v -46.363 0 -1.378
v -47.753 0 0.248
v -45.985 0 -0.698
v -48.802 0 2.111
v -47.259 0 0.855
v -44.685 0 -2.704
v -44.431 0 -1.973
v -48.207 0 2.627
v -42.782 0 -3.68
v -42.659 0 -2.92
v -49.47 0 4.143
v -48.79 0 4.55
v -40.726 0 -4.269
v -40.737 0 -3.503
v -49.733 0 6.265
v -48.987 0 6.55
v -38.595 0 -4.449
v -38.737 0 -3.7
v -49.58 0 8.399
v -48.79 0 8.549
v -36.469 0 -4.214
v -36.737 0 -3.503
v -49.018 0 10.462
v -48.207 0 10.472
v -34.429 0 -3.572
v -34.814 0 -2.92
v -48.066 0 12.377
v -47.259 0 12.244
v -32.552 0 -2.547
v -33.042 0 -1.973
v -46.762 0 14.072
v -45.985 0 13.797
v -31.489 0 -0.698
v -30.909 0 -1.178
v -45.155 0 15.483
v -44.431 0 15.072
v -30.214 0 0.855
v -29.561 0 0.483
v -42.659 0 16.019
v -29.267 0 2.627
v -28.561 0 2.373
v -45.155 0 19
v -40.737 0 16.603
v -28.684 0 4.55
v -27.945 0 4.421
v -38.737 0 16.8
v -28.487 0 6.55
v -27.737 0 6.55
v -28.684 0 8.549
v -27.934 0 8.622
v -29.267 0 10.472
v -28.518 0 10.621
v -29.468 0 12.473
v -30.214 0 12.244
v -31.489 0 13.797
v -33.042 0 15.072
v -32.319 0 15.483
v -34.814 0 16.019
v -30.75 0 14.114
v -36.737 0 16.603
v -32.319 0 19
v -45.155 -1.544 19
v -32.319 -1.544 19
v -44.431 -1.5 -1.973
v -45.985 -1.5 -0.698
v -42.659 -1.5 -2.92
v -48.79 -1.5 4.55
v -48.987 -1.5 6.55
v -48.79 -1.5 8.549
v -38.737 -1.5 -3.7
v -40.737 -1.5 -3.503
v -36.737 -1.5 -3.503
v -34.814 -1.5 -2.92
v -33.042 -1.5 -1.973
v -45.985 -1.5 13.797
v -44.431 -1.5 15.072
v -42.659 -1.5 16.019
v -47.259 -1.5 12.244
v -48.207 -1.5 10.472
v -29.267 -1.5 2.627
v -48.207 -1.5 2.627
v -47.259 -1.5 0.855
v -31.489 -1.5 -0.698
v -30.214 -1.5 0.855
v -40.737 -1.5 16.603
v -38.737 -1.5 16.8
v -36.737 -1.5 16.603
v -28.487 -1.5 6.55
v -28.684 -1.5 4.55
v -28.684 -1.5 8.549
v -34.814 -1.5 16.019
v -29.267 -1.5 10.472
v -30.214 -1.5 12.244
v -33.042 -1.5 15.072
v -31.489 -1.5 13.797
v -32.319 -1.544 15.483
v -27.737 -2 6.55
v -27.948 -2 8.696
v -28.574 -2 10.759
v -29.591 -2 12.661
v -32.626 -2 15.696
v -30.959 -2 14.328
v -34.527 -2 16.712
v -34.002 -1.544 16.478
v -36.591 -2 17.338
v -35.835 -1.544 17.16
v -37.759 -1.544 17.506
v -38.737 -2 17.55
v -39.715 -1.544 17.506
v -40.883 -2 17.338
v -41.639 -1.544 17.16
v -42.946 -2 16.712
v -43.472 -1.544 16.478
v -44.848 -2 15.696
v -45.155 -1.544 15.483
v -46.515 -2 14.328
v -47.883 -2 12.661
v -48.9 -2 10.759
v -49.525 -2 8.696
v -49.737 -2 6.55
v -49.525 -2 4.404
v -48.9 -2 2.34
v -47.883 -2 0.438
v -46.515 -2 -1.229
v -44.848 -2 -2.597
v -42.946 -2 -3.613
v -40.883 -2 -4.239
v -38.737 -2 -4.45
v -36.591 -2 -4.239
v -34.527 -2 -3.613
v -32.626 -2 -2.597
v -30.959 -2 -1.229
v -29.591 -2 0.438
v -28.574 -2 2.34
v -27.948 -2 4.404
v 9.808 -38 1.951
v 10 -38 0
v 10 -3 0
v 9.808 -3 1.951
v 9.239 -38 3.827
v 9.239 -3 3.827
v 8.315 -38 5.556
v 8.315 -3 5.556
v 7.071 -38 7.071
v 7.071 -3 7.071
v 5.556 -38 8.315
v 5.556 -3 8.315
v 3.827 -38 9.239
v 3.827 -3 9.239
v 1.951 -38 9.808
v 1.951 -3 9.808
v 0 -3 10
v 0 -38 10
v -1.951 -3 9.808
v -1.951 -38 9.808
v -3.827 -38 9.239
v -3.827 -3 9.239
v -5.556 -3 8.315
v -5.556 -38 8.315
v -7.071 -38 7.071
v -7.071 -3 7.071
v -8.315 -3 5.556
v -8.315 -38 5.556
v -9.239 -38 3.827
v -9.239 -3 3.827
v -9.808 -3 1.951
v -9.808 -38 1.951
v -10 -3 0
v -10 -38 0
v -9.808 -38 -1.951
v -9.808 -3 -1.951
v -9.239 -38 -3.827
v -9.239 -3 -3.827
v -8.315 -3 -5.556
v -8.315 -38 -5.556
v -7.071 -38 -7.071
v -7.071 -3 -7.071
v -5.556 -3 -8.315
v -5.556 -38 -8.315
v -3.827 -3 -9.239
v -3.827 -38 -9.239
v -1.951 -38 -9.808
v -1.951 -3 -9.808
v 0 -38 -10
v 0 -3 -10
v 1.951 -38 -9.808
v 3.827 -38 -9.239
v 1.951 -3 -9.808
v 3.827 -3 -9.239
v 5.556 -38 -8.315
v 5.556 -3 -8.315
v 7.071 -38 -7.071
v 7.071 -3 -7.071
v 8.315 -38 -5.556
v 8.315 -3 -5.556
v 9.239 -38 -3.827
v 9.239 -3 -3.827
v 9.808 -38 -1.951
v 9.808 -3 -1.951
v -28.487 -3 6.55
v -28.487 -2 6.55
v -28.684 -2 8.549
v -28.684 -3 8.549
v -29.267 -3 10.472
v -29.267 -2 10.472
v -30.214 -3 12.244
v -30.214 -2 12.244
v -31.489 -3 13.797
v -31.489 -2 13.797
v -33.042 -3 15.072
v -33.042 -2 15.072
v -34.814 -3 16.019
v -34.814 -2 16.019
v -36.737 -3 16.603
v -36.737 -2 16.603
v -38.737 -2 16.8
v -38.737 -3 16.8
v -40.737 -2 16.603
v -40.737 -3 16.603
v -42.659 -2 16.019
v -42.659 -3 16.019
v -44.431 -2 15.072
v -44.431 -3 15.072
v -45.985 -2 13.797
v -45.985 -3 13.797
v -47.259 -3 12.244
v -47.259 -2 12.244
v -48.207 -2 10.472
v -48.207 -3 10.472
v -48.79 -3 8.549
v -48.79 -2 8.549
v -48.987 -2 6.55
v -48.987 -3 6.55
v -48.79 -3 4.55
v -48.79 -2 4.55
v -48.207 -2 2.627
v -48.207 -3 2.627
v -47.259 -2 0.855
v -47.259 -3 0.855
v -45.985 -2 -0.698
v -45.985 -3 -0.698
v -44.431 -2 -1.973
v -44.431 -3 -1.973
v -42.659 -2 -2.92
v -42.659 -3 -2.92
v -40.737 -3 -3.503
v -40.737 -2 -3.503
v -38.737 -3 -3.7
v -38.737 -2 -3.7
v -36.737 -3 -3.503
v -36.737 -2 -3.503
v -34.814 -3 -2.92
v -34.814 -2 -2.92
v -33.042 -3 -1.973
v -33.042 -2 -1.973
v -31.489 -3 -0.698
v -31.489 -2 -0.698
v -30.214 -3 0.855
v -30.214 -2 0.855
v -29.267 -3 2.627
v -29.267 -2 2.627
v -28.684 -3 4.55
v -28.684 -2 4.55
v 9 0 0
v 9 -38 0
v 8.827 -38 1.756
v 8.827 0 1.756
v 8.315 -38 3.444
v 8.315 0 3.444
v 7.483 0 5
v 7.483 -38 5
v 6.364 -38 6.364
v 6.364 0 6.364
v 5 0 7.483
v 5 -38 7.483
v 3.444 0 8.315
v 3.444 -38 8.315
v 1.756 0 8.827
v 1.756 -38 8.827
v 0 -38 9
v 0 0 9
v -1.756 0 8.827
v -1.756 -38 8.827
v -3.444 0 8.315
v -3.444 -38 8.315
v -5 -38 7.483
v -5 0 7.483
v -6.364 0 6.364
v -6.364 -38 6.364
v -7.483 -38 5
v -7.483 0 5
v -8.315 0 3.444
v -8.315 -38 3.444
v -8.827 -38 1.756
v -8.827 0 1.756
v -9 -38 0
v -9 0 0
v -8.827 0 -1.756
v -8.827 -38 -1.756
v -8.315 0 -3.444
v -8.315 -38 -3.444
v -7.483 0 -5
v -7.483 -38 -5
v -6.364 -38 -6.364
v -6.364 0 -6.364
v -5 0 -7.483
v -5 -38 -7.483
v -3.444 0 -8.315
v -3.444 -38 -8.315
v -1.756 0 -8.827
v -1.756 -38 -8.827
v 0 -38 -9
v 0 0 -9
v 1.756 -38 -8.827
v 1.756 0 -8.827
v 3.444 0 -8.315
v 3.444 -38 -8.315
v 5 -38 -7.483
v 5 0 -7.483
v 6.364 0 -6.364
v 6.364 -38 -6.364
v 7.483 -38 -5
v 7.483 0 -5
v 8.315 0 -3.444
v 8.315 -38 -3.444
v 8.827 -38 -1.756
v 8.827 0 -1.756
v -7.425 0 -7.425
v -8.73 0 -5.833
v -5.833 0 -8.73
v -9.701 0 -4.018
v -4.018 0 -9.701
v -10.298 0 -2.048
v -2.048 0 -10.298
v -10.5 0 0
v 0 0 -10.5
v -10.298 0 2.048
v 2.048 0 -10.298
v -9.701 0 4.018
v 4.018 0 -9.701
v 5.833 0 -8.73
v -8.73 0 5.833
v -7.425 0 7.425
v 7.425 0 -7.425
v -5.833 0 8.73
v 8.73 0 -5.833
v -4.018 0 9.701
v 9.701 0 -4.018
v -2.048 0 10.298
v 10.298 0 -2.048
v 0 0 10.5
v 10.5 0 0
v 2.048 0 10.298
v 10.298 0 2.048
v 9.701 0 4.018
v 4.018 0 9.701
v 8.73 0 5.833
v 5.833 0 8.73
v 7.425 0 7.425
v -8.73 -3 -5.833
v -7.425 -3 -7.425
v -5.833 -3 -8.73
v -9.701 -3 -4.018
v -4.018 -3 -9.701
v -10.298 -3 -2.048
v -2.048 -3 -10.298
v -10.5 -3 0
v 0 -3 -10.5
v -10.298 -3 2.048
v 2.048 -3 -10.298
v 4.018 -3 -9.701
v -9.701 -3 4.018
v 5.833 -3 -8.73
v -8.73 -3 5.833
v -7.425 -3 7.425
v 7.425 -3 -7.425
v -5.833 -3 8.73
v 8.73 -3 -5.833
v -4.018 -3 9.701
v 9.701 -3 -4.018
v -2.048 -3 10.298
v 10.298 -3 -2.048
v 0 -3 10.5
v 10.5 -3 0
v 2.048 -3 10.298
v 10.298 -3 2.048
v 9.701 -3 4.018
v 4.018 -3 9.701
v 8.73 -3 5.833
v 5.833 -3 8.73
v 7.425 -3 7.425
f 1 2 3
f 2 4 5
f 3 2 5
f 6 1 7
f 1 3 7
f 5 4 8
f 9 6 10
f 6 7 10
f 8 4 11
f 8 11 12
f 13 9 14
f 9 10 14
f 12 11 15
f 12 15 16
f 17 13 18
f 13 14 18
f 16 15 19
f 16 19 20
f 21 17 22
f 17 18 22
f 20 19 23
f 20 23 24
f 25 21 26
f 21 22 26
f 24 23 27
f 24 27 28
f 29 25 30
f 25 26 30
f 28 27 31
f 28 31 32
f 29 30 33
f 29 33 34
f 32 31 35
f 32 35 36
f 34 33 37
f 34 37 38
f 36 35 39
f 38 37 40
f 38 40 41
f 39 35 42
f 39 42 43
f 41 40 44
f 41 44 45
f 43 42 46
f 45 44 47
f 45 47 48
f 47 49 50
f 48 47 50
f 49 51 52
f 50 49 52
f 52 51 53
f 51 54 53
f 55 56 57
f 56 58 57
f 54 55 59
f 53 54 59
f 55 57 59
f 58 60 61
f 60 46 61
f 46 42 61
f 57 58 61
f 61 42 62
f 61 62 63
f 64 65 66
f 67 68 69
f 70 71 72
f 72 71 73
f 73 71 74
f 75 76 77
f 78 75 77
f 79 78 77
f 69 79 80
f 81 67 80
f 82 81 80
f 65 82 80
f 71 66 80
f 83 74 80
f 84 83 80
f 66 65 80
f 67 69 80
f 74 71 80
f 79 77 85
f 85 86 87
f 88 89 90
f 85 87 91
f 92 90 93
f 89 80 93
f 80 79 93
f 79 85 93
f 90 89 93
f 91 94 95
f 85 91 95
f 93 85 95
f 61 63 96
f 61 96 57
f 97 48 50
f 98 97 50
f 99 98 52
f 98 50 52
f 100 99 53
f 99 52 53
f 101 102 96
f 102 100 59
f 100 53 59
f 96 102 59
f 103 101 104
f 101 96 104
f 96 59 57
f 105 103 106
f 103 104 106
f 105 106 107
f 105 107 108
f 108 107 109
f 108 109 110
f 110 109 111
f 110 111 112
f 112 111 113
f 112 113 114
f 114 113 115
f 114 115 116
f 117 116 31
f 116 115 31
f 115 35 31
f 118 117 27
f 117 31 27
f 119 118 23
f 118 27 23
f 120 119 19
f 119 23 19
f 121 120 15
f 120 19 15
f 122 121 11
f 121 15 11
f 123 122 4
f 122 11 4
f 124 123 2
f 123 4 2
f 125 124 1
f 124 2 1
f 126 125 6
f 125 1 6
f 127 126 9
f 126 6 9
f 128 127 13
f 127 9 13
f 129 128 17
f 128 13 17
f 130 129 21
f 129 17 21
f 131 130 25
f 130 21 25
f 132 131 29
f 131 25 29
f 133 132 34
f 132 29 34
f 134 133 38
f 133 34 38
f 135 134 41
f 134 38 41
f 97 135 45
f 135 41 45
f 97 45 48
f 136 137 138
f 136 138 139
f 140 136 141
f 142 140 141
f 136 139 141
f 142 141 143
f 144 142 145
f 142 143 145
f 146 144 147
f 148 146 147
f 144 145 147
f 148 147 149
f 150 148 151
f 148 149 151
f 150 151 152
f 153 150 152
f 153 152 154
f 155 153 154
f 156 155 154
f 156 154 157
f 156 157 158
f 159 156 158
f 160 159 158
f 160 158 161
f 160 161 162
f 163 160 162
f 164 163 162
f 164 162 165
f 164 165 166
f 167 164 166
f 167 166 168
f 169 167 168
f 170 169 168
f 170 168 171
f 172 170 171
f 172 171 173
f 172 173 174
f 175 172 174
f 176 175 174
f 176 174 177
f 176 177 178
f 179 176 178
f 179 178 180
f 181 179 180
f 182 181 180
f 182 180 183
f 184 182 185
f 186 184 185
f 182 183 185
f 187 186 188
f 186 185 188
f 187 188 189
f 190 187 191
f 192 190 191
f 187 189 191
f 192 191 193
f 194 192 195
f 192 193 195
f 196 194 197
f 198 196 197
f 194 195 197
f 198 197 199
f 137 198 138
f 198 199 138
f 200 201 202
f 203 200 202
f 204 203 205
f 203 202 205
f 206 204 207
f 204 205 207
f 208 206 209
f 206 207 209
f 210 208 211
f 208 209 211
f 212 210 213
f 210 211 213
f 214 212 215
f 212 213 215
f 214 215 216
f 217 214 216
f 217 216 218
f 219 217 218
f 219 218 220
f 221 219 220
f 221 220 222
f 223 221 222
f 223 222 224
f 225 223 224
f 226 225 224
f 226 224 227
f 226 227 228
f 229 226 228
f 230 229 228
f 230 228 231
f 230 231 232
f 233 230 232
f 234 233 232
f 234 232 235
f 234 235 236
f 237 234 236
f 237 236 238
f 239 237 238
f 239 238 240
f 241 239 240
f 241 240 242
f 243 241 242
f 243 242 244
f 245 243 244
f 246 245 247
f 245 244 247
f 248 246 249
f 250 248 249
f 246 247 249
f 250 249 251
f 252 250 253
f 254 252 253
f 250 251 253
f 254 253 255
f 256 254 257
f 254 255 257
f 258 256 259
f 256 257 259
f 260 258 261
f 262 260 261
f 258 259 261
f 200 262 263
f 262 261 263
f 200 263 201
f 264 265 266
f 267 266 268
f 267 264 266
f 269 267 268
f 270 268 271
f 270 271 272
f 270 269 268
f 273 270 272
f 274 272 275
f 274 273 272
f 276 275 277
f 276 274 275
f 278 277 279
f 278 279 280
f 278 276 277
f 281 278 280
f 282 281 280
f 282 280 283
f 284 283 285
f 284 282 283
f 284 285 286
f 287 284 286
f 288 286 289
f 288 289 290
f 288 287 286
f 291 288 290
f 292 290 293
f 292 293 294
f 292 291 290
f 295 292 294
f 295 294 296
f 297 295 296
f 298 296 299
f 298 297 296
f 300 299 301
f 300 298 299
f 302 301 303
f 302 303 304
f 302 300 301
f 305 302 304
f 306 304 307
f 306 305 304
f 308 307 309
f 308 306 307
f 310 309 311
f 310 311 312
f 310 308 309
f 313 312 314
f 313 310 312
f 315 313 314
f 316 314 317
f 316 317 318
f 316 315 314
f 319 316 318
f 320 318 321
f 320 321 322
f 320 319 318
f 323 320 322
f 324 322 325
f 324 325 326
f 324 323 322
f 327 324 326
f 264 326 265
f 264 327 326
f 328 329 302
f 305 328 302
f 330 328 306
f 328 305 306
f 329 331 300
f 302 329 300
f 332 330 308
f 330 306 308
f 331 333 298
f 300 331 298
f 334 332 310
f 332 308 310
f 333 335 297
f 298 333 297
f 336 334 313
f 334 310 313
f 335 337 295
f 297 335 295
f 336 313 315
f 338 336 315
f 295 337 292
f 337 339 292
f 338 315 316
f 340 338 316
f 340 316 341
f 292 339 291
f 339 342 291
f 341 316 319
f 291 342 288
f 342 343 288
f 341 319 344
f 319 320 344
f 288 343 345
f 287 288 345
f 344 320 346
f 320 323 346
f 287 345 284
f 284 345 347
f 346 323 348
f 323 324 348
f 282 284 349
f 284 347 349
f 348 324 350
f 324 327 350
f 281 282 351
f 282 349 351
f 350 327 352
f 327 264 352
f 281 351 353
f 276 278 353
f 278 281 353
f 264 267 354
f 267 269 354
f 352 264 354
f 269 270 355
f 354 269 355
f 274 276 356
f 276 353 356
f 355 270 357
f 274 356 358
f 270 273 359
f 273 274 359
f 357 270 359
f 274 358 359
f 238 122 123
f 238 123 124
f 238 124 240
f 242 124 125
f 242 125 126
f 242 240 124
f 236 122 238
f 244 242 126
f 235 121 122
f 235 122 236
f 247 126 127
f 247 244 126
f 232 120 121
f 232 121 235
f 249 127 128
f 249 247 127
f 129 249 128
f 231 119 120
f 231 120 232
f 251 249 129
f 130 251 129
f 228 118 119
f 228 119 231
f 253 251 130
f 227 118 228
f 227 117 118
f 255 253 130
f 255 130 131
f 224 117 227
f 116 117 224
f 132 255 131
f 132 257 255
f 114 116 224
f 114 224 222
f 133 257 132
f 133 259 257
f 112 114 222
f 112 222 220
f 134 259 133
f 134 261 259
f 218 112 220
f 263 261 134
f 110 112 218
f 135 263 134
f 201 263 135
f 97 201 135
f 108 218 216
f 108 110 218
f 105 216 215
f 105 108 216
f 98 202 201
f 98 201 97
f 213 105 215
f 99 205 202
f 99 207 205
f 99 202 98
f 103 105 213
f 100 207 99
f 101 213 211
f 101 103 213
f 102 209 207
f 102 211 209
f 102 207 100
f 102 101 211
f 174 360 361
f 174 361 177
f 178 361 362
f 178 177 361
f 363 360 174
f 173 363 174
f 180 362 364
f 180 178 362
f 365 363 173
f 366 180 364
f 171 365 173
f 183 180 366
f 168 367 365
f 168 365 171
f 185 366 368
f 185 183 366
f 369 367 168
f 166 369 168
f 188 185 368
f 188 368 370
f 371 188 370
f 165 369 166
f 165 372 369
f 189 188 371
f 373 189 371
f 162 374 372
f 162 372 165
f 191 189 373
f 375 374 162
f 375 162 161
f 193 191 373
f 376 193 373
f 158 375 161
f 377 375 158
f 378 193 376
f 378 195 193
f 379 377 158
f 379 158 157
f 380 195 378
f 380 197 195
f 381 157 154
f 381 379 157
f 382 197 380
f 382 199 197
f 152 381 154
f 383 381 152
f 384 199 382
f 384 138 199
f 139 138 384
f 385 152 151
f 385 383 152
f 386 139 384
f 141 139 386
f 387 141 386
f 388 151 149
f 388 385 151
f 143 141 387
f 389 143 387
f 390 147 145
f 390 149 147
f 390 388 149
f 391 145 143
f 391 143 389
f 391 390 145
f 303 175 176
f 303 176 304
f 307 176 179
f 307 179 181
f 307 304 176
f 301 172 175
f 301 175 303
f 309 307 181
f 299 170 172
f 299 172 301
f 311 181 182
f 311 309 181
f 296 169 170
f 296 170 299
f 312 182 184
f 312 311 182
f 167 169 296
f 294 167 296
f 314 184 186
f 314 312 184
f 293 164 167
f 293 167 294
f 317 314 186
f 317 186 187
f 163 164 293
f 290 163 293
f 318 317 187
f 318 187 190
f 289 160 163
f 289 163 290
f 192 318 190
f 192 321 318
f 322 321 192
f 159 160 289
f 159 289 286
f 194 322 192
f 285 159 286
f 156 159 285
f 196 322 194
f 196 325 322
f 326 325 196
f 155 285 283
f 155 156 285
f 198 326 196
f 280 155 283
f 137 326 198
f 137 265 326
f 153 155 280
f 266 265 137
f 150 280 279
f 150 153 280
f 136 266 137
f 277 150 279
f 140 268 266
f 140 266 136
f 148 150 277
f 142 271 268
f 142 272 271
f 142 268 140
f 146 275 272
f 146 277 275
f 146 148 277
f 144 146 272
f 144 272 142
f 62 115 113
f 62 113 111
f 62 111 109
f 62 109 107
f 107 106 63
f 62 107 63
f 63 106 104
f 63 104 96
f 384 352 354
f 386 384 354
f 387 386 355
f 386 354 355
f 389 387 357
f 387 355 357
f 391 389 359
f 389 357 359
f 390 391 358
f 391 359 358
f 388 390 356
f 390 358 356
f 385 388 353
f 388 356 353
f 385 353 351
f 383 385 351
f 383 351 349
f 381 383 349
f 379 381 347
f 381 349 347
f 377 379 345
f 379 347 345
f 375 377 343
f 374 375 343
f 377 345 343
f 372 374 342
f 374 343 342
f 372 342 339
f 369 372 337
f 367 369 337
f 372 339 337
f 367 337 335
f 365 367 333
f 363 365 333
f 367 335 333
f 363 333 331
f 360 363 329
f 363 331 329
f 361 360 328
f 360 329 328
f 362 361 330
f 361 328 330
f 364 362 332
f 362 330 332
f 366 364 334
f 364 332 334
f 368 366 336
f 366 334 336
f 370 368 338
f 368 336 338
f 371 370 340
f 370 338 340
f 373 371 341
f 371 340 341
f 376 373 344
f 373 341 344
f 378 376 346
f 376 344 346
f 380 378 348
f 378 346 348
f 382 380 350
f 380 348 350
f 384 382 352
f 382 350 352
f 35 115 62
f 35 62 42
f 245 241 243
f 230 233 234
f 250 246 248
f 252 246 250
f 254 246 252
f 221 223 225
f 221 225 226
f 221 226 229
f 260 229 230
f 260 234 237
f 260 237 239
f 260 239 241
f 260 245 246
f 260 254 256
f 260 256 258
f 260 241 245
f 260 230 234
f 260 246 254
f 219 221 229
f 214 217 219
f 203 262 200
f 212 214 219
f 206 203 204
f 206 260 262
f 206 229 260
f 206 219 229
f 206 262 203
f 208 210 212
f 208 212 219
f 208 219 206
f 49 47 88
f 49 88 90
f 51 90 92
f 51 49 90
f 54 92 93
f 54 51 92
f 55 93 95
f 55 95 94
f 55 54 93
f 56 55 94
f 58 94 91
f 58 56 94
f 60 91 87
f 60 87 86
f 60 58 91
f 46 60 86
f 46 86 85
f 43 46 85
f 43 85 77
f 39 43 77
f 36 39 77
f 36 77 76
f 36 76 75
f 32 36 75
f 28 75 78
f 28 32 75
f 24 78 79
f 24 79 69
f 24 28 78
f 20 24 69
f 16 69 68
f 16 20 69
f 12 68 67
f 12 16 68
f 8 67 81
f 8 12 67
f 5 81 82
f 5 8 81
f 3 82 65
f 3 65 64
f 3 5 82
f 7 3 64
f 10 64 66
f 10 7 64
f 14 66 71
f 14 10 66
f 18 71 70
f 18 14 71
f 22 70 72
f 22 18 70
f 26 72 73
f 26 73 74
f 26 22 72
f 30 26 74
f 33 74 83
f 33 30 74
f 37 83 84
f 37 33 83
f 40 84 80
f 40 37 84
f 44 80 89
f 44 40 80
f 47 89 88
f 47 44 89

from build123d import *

# Parameters (mm, degrees)
F0_R     = 10
F0_R_2   = 9
F1_DEPTH = 38
F0_R_3   = 10.5
F2_DEPTH = 3
F3_R     = 11
F3_R_2   = 10.25
F4_DEPTH = 2
F5_DEPTH = 3
F6_W     = 12.836099
F6_H     = 1.544234
F7_DEPTH = 19
F8_DEPTH = 1.5


with BuildPart() as f1:
    # F0 (on Front) → F1 (new body)
    with BuildSketch(Plane.XZ):
        Circle(F0_R)
        Circle(F0_R_2, mode=Mode.SUBTRACT)
    extrude(amount=F1_DEPTH)

    # F0 (on Front) → F2 (join)
    with BuildSketch(Plane.XZ):
        Circle(F0_R_3)
        Circle(F0_R, mode=Mode.SUBTRACT)
    extrude(amount=F2_DEPTH)


with BuildPart() as f4:
    # F3 (on Front) → F4 (new body)
    with BuildSketch(Plane.XZ):
        with Locations((-38.736828, 6.549636)):
            Circle(F3_R)
        with Locations((-38.736828, 6.549636)):
            Circle(F3_R_2, mode=Mode.SUBTRACT)
    extrude(amount=F4_DEPTH)

    # F3 (on Front) → F5 (join)
    with BuildSketch(Plane.XZ):
        with Locations((-38.736828, 6.549636)):
            Circle(F3_R_2)
    extrude(amount=F5_DEPTH)

    # F6 (on Top) → F7 (join)
    with BuildSketch(Plane.XY):
        with Locations((-38.736828, -0.772117)):
            Rectangle(F6_W, F6_H)
    extrude(amount=F7_DEPTH)

    # F3 (on Front) → F8 (cut)
    with BuildSketch(Plane.XZ):
        with Locations((-38.736828, 6.549636)):
            Circle(F3_R_2)
    extrude(amount=F8_DEPTH, mode=Mode.SUBTRACT)


solid = Compound([f1.part, f4.part])
